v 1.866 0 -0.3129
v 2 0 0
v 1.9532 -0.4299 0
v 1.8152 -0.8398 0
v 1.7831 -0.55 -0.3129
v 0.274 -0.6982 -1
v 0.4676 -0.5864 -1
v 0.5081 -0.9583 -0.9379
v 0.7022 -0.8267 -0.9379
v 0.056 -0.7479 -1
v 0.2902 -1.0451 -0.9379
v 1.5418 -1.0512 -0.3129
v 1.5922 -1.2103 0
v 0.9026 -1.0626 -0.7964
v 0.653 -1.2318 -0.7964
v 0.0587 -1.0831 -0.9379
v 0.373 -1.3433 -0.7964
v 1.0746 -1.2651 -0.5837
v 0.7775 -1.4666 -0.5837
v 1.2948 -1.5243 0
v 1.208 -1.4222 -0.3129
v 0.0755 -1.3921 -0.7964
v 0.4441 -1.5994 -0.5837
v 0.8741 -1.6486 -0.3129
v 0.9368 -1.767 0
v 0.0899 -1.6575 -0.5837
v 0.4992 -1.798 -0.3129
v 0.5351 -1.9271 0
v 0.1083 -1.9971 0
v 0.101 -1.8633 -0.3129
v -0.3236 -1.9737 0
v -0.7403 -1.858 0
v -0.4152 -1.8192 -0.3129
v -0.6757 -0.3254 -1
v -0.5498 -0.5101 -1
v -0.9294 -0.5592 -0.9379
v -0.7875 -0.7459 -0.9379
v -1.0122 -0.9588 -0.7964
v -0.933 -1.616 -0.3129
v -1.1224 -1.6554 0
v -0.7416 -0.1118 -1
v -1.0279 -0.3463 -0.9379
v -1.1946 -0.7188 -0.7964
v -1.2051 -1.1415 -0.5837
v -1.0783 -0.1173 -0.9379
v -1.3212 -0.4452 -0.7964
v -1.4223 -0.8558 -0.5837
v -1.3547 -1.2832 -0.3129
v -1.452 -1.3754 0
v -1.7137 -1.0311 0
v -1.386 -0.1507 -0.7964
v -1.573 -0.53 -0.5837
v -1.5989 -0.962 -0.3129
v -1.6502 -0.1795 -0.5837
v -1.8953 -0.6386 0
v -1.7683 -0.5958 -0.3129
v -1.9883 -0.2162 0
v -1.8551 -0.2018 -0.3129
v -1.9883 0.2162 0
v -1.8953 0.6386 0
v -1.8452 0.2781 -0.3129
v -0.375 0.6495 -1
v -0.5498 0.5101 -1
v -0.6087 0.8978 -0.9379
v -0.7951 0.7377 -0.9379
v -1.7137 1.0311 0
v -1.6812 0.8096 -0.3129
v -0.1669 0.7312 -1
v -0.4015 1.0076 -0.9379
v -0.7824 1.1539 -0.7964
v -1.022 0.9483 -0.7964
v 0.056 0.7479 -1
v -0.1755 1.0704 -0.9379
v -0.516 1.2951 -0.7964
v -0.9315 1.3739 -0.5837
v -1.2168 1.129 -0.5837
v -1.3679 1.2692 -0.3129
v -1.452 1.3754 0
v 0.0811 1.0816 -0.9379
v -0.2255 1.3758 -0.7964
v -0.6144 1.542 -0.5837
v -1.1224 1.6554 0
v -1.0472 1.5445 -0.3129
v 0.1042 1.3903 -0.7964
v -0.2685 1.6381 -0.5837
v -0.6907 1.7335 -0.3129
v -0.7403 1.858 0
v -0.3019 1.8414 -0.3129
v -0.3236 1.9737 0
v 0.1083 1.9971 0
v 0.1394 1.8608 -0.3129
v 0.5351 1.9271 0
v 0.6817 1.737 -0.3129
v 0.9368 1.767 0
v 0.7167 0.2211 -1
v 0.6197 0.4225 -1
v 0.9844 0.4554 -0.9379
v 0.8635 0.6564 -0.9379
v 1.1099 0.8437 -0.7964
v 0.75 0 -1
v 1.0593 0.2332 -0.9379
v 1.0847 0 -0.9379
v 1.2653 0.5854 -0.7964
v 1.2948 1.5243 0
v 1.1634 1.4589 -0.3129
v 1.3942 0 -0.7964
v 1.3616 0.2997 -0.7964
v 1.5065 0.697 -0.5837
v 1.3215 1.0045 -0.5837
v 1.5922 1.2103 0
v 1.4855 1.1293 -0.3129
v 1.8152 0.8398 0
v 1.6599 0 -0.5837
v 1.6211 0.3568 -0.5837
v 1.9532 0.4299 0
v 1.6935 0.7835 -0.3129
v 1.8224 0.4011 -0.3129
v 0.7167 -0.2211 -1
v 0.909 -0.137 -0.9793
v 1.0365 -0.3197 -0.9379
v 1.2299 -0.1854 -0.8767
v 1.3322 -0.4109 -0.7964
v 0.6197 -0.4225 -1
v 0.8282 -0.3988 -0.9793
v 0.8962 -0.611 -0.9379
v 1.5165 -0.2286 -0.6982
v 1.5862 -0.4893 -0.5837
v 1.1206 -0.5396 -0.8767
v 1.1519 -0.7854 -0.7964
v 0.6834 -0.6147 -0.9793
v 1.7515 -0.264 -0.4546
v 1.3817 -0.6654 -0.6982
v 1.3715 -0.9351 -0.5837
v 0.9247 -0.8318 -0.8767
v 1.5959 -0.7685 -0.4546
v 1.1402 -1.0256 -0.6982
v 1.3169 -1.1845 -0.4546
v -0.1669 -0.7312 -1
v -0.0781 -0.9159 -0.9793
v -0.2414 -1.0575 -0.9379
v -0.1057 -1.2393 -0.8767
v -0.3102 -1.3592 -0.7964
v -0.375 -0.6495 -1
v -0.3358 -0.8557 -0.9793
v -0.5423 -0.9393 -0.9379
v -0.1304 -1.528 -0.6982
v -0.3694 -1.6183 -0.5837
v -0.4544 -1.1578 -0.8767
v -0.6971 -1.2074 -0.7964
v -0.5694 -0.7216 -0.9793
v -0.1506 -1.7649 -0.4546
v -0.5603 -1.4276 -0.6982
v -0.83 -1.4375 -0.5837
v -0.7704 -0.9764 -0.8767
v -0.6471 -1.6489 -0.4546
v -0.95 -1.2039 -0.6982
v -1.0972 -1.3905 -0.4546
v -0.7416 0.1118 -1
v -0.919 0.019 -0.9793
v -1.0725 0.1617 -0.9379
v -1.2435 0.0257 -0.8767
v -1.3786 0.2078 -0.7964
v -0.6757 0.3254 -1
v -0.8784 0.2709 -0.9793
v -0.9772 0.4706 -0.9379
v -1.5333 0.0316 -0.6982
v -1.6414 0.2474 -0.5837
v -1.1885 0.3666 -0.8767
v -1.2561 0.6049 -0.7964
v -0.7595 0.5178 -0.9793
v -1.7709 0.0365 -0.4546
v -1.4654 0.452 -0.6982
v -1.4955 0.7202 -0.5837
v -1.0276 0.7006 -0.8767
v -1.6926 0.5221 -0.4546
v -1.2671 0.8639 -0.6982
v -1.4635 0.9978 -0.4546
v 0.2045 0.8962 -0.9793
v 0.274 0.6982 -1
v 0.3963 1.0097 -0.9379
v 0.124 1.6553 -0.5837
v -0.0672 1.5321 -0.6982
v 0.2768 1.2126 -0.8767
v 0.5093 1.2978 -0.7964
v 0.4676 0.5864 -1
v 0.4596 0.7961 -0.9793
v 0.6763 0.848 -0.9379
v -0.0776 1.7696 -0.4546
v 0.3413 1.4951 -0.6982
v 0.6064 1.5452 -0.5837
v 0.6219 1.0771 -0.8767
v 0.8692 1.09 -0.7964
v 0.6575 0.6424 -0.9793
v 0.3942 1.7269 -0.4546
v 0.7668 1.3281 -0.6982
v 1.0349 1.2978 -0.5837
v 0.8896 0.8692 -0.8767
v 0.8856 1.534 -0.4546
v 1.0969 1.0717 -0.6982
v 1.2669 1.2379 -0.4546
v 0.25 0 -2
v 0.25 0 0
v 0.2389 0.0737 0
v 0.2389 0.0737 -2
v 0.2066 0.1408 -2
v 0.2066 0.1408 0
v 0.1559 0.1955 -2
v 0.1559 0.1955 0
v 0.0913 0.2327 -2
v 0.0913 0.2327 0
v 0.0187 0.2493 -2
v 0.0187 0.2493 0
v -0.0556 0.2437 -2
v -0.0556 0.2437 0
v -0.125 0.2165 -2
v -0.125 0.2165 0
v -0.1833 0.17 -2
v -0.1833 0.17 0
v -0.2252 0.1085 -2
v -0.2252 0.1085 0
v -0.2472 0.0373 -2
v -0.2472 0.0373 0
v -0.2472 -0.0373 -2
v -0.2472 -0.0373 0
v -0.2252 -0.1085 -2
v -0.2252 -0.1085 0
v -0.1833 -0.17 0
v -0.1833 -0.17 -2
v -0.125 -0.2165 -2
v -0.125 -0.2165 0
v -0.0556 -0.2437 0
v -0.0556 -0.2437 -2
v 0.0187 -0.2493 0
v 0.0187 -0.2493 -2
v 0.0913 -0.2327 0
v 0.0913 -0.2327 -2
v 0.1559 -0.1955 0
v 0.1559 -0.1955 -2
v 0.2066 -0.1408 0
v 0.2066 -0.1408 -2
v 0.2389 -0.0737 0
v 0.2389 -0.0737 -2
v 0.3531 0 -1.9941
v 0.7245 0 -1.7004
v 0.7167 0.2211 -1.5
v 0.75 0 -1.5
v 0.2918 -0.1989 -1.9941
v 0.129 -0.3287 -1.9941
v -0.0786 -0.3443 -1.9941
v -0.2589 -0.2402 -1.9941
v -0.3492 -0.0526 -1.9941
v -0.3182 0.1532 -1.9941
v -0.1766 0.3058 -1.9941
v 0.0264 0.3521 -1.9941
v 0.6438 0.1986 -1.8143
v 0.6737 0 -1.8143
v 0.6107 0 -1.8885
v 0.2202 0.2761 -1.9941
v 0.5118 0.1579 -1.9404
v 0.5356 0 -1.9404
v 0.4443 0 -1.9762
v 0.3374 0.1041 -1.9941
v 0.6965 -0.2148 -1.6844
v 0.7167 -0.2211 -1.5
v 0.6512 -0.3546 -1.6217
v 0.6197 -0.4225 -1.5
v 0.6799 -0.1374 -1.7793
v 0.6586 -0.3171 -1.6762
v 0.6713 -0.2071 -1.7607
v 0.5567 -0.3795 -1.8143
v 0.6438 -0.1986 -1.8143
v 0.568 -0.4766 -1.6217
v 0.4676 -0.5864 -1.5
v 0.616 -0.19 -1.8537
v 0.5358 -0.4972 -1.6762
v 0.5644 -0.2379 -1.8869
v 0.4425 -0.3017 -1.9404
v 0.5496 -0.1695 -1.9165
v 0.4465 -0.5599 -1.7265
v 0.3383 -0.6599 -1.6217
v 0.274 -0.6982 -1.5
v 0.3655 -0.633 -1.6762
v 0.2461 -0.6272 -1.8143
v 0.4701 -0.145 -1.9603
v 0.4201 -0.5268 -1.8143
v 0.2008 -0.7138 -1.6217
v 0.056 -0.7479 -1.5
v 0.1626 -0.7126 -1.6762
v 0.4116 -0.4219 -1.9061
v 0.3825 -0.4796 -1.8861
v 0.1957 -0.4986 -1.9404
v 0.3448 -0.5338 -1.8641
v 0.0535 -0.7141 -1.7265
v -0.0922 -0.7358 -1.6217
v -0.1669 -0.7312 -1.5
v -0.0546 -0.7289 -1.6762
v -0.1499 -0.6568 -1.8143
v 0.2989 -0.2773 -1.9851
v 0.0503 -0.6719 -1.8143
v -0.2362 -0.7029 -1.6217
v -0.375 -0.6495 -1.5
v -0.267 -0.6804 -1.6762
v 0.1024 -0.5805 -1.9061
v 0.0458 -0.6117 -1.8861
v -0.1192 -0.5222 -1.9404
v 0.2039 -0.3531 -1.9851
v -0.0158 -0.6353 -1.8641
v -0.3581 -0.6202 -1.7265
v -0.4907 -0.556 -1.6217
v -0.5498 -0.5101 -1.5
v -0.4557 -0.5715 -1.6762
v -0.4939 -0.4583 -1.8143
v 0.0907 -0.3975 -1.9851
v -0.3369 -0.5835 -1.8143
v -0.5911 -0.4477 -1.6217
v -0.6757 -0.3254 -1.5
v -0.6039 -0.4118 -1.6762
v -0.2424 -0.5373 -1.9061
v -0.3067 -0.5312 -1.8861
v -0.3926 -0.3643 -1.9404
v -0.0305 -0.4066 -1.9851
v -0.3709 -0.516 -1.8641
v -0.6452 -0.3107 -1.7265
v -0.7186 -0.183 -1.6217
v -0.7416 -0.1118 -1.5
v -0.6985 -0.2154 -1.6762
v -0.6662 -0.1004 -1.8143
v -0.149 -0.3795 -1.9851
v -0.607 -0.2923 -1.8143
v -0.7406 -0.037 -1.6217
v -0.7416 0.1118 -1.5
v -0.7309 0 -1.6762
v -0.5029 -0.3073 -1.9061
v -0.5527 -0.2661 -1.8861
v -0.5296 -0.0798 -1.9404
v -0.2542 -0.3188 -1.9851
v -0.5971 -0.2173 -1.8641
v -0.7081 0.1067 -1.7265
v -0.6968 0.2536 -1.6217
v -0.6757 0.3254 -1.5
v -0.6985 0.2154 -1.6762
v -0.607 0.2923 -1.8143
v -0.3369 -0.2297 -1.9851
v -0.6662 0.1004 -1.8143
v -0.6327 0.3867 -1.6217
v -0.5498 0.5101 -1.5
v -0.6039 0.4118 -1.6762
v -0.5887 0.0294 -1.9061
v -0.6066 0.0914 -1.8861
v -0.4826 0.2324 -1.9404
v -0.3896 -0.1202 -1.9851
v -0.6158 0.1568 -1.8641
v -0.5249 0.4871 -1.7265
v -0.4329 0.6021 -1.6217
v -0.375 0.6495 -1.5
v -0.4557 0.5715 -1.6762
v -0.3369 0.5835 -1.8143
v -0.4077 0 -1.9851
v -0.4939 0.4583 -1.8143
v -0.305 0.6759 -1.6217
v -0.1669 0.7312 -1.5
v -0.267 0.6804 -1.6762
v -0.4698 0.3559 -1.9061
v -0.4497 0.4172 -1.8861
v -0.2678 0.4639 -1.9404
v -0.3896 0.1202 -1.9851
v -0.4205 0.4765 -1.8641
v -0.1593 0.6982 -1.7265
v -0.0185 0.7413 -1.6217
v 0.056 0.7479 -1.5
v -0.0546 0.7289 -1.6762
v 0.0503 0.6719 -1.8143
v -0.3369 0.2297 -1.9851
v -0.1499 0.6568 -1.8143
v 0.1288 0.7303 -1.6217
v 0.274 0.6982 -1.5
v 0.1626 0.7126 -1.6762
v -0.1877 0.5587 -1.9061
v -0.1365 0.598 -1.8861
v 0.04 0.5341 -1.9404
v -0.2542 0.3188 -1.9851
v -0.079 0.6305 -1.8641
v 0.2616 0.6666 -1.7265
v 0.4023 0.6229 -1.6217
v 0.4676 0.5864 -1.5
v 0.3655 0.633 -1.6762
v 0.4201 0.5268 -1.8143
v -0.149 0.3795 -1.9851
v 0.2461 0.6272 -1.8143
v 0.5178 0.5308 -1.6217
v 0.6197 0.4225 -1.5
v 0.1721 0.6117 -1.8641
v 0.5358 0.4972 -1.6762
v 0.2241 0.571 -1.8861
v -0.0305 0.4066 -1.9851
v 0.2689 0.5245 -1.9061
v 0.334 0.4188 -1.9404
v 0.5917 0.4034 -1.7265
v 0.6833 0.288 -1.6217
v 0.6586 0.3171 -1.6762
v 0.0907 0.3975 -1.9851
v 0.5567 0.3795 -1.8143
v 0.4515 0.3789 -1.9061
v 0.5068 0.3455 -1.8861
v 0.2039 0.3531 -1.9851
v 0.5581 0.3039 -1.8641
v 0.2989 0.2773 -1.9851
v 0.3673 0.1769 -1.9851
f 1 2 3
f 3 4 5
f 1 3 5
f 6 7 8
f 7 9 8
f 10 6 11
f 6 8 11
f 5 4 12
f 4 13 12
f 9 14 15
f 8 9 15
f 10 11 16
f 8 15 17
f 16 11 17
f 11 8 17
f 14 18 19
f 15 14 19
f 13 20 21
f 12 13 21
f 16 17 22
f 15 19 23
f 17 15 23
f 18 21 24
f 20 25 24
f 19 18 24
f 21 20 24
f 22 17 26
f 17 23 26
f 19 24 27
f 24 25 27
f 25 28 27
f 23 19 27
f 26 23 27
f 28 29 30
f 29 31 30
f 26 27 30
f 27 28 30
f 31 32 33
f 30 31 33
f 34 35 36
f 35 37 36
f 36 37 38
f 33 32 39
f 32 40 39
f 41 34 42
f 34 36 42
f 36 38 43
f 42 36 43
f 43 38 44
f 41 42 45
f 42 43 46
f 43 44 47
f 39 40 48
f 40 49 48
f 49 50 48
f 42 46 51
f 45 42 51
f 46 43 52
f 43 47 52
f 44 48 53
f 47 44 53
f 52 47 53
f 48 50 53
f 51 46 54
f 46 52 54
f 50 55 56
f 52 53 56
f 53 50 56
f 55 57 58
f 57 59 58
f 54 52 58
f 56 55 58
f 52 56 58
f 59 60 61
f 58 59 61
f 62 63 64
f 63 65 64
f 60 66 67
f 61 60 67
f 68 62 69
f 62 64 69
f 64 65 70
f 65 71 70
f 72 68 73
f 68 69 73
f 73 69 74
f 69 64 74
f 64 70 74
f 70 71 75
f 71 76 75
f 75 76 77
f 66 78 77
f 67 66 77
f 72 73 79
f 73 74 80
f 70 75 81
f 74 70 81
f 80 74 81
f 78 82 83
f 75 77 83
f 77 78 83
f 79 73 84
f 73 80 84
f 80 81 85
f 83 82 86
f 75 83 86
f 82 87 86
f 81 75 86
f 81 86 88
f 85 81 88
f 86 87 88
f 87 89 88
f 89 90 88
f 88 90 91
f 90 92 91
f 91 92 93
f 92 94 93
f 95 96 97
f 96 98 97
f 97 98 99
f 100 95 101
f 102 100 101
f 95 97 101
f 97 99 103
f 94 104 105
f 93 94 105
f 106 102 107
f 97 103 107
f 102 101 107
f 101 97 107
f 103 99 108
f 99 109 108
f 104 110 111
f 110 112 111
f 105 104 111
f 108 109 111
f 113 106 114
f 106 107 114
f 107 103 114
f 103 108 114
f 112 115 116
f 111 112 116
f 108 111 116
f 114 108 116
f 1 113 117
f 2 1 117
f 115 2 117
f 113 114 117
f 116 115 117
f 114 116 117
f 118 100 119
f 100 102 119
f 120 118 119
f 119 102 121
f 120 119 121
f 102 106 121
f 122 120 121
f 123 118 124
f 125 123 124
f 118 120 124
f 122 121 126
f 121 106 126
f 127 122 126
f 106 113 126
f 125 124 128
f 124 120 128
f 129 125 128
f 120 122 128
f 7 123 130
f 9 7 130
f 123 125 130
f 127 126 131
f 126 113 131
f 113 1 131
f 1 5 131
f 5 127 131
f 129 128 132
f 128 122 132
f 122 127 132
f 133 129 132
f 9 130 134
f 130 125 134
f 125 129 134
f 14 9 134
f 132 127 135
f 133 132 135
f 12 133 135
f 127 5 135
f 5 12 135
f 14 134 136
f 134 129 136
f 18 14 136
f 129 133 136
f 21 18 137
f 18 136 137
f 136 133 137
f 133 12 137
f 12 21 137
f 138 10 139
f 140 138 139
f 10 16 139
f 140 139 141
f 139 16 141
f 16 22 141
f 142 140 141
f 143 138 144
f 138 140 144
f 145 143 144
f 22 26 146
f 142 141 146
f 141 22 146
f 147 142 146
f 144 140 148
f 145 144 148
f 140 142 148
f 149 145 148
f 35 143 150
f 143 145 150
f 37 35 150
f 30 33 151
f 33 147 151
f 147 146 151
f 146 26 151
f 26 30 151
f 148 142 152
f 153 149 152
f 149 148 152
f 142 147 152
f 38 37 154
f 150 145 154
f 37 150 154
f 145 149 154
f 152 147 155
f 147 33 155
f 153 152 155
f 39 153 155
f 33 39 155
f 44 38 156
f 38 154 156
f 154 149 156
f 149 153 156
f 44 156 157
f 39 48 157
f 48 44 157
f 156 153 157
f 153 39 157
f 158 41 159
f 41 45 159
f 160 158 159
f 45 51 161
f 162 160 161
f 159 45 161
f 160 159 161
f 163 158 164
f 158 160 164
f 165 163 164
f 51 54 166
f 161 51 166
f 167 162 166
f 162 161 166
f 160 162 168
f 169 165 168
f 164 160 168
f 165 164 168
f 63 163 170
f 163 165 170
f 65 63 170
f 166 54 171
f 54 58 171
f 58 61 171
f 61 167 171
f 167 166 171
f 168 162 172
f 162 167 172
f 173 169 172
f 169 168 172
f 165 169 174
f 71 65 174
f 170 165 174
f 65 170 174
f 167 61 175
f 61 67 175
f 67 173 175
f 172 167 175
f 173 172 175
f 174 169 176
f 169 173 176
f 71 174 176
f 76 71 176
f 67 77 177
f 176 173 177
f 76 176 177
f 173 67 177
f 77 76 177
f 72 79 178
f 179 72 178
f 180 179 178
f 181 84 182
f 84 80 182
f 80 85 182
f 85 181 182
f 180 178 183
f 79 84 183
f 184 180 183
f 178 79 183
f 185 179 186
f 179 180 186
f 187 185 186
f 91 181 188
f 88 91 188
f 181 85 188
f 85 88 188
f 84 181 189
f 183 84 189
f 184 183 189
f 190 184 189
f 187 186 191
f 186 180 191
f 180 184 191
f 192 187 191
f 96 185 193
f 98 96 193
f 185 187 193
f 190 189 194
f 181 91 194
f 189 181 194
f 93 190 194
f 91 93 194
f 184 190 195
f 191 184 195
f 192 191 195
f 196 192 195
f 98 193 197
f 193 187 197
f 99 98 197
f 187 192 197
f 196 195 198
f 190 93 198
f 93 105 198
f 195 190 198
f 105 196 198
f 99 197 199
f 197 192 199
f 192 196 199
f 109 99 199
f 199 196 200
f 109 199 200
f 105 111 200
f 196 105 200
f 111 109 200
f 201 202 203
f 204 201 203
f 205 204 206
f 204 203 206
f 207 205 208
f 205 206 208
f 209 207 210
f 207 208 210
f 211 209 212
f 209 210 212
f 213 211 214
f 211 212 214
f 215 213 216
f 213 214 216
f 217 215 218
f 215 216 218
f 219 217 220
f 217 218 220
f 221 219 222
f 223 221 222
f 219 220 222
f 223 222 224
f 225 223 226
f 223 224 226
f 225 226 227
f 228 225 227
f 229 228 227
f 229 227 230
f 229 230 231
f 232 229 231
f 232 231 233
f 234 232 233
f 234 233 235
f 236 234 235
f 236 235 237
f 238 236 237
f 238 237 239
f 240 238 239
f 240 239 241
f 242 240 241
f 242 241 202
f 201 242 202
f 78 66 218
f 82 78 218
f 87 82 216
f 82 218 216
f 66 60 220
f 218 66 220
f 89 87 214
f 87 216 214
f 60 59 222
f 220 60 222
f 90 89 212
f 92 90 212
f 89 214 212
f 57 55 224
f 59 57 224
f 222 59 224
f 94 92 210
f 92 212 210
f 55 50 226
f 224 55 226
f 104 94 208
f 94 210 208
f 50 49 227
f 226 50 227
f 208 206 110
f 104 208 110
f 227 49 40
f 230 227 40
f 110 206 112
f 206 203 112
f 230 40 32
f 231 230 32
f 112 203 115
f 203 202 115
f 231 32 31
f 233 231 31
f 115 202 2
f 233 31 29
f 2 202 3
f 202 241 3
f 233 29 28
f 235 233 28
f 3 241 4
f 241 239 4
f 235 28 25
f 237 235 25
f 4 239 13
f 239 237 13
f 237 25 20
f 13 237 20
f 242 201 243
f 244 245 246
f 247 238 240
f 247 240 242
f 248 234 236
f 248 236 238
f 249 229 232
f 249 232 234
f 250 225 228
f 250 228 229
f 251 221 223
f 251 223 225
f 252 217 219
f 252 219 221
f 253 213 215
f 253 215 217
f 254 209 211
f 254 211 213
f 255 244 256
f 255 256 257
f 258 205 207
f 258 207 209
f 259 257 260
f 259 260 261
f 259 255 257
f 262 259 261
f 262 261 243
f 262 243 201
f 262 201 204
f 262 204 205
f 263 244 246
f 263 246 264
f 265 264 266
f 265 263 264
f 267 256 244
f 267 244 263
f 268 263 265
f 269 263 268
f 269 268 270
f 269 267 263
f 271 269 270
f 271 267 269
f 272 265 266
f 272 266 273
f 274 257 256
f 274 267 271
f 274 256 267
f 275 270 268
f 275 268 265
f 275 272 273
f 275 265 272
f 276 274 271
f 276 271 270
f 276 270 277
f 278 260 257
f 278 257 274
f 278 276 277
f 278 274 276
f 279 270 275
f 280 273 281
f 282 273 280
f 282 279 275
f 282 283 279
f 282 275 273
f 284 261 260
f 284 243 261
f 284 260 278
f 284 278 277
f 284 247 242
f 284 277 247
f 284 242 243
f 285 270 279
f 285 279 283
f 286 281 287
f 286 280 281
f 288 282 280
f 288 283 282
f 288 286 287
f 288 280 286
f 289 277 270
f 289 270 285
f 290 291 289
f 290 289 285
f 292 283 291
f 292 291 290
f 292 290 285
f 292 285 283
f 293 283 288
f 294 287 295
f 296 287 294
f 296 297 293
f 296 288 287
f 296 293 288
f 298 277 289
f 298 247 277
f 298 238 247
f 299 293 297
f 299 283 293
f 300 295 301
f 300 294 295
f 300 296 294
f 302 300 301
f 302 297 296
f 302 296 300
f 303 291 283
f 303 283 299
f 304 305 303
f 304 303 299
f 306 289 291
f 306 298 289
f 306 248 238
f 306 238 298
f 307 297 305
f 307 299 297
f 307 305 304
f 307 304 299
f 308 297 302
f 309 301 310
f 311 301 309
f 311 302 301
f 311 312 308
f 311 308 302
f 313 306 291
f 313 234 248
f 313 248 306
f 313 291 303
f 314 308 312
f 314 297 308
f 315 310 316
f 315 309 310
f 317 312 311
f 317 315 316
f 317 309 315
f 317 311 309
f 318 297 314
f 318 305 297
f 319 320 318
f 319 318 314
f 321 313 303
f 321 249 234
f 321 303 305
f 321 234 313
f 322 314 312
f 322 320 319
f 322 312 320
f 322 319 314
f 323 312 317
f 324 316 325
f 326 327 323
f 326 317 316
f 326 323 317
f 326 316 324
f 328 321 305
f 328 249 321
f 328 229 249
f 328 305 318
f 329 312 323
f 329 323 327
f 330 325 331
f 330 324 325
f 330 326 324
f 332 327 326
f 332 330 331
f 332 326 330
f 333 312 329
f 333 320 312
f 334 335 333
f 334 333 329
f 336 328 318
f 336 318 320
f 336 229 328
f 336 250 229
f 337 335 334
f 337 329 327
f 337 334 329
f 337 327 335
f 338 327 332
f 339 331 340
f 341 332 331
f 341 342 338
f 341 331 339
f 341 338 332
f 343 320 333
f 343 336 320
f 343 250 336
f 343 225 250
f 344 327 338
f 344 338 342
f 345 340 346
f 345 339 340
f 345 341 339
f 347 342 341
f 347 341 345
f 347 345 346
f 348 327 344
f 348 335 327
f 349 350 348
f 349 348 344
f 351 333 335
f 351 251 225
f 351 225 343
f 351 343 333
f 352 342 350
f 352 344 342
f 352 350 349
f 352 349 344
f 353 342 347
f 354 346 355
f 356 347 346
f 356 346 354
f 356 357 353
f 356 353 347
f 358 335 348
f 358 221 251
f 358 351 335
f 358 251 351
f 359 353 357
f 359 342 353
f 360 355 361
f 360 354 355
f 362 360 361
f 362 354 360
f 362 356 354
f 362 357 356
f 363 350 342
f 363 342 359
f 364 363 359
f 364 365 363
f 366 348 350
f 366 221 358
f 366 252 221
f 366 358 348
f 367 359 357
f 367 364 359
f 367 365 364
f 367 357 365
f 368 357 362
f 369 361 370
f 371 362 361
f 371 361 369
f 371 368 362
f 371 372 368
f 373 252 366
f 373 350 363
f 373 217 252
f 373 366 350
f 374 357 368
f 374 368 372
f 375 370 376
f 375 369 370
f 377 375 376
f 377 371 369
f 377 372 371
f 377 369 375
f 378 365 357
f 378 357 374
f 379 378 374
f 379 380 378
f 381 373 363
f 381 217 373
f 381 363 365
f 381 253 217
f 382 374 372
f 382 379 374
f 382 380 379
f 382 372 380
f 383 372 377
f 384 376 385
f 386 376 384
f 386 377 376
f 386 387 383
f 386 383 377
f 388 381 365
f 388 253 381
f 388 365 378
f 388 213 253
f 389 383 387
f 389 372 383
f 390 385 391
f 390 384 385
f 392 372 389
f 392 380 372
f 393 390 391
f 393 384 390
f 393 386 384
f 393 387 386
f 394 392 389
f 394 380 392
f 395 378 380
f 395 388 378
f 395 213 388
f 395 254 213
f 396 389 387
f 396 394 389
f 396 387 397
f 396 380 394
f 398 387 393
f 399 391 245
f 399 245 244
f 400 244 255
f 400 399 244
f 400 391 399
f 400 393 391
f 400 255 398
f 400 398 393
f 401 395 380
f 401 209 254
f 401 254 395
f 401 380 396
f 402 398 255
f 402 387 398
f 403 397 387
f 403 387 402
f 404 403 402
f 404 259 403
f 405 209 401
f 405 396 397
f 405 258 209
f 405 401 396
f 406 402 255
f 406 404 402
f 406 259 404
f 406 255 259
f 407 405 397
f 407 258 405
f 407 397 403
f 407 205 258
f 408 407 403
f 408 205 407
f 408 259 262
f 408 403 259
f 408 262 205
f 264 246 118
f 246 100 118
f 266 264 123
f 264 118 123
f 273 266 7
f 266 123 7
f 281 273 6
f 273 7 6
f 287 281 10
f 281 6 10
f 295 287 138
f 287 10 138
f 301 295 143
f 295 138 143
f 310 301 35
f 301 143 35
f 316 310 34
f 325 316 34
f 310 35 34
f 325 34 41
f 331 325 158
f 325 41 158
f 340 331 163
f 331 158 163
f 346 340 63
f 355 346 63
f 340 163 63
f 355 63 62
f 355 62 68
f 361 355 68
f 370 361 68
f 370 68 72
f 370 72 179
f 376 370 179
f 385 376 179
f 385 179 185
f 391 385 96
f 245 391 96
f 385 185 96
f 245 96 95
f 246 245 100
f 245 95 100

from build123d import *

# Parameters (mm, degrees)
F2_R     = 0.25
F3_DEPTH = 2.001


# Not quite as in the source:
# - a fillet or chamfer that OpenCascade refuses, or shapes differently, is made with other operations: its cross-section is extruded or revolved along the edge and cut away or added


with BuildPart() as f1:
    # F0 (on Front) → F1 (revolve)
    with BuildSketch(Plane.XZ):
        with BuildLine():
            Line((2, 0), (0, 0))
            Line((0, 0), (0, -2))
            Line((0, -2), (0.75, -2))
            Line((0.75, -2), (0.75, -1))
            ThreePointArc((0.75, -1), (1.533581534, -0.6982269175), (2, 0))
        make_face()
    revolve(axis=Axis((0, 0, -1.625075005), (0, 0, -1)))

    # F2 (on face) → F3 (cut, through all)
    with BuildSketch(Plane.XY):
        Circle(F2_R)
    extrude(amount=-F3_DEPTH, mode=Mode.SUBTRACT)

    # F4: fillet of radius 0.5 on 1 edges, made by hand

    # F4_s1 → F4_t2 (revolve, cut)
    with BuildSketch(Plane.XZ):
        with BuildLine():
            add(Edge.make_bspline(
                [(0.75, -1.5), (0.75, -2), (0.25, -2)],
                knots=[0, 0, 0, 1, 1, 1], degree=2, weights=[1, 1, 1]))
            Line((0.25, -2), (0.75, -2))
            Line((0.75, -2), (0.75, -1.5))
        make_face()
    revolve(axis=Axis((0, 0, -2), (0, 0, -1)), mode=Mode.SUBTRACT)


solid = f1.part
